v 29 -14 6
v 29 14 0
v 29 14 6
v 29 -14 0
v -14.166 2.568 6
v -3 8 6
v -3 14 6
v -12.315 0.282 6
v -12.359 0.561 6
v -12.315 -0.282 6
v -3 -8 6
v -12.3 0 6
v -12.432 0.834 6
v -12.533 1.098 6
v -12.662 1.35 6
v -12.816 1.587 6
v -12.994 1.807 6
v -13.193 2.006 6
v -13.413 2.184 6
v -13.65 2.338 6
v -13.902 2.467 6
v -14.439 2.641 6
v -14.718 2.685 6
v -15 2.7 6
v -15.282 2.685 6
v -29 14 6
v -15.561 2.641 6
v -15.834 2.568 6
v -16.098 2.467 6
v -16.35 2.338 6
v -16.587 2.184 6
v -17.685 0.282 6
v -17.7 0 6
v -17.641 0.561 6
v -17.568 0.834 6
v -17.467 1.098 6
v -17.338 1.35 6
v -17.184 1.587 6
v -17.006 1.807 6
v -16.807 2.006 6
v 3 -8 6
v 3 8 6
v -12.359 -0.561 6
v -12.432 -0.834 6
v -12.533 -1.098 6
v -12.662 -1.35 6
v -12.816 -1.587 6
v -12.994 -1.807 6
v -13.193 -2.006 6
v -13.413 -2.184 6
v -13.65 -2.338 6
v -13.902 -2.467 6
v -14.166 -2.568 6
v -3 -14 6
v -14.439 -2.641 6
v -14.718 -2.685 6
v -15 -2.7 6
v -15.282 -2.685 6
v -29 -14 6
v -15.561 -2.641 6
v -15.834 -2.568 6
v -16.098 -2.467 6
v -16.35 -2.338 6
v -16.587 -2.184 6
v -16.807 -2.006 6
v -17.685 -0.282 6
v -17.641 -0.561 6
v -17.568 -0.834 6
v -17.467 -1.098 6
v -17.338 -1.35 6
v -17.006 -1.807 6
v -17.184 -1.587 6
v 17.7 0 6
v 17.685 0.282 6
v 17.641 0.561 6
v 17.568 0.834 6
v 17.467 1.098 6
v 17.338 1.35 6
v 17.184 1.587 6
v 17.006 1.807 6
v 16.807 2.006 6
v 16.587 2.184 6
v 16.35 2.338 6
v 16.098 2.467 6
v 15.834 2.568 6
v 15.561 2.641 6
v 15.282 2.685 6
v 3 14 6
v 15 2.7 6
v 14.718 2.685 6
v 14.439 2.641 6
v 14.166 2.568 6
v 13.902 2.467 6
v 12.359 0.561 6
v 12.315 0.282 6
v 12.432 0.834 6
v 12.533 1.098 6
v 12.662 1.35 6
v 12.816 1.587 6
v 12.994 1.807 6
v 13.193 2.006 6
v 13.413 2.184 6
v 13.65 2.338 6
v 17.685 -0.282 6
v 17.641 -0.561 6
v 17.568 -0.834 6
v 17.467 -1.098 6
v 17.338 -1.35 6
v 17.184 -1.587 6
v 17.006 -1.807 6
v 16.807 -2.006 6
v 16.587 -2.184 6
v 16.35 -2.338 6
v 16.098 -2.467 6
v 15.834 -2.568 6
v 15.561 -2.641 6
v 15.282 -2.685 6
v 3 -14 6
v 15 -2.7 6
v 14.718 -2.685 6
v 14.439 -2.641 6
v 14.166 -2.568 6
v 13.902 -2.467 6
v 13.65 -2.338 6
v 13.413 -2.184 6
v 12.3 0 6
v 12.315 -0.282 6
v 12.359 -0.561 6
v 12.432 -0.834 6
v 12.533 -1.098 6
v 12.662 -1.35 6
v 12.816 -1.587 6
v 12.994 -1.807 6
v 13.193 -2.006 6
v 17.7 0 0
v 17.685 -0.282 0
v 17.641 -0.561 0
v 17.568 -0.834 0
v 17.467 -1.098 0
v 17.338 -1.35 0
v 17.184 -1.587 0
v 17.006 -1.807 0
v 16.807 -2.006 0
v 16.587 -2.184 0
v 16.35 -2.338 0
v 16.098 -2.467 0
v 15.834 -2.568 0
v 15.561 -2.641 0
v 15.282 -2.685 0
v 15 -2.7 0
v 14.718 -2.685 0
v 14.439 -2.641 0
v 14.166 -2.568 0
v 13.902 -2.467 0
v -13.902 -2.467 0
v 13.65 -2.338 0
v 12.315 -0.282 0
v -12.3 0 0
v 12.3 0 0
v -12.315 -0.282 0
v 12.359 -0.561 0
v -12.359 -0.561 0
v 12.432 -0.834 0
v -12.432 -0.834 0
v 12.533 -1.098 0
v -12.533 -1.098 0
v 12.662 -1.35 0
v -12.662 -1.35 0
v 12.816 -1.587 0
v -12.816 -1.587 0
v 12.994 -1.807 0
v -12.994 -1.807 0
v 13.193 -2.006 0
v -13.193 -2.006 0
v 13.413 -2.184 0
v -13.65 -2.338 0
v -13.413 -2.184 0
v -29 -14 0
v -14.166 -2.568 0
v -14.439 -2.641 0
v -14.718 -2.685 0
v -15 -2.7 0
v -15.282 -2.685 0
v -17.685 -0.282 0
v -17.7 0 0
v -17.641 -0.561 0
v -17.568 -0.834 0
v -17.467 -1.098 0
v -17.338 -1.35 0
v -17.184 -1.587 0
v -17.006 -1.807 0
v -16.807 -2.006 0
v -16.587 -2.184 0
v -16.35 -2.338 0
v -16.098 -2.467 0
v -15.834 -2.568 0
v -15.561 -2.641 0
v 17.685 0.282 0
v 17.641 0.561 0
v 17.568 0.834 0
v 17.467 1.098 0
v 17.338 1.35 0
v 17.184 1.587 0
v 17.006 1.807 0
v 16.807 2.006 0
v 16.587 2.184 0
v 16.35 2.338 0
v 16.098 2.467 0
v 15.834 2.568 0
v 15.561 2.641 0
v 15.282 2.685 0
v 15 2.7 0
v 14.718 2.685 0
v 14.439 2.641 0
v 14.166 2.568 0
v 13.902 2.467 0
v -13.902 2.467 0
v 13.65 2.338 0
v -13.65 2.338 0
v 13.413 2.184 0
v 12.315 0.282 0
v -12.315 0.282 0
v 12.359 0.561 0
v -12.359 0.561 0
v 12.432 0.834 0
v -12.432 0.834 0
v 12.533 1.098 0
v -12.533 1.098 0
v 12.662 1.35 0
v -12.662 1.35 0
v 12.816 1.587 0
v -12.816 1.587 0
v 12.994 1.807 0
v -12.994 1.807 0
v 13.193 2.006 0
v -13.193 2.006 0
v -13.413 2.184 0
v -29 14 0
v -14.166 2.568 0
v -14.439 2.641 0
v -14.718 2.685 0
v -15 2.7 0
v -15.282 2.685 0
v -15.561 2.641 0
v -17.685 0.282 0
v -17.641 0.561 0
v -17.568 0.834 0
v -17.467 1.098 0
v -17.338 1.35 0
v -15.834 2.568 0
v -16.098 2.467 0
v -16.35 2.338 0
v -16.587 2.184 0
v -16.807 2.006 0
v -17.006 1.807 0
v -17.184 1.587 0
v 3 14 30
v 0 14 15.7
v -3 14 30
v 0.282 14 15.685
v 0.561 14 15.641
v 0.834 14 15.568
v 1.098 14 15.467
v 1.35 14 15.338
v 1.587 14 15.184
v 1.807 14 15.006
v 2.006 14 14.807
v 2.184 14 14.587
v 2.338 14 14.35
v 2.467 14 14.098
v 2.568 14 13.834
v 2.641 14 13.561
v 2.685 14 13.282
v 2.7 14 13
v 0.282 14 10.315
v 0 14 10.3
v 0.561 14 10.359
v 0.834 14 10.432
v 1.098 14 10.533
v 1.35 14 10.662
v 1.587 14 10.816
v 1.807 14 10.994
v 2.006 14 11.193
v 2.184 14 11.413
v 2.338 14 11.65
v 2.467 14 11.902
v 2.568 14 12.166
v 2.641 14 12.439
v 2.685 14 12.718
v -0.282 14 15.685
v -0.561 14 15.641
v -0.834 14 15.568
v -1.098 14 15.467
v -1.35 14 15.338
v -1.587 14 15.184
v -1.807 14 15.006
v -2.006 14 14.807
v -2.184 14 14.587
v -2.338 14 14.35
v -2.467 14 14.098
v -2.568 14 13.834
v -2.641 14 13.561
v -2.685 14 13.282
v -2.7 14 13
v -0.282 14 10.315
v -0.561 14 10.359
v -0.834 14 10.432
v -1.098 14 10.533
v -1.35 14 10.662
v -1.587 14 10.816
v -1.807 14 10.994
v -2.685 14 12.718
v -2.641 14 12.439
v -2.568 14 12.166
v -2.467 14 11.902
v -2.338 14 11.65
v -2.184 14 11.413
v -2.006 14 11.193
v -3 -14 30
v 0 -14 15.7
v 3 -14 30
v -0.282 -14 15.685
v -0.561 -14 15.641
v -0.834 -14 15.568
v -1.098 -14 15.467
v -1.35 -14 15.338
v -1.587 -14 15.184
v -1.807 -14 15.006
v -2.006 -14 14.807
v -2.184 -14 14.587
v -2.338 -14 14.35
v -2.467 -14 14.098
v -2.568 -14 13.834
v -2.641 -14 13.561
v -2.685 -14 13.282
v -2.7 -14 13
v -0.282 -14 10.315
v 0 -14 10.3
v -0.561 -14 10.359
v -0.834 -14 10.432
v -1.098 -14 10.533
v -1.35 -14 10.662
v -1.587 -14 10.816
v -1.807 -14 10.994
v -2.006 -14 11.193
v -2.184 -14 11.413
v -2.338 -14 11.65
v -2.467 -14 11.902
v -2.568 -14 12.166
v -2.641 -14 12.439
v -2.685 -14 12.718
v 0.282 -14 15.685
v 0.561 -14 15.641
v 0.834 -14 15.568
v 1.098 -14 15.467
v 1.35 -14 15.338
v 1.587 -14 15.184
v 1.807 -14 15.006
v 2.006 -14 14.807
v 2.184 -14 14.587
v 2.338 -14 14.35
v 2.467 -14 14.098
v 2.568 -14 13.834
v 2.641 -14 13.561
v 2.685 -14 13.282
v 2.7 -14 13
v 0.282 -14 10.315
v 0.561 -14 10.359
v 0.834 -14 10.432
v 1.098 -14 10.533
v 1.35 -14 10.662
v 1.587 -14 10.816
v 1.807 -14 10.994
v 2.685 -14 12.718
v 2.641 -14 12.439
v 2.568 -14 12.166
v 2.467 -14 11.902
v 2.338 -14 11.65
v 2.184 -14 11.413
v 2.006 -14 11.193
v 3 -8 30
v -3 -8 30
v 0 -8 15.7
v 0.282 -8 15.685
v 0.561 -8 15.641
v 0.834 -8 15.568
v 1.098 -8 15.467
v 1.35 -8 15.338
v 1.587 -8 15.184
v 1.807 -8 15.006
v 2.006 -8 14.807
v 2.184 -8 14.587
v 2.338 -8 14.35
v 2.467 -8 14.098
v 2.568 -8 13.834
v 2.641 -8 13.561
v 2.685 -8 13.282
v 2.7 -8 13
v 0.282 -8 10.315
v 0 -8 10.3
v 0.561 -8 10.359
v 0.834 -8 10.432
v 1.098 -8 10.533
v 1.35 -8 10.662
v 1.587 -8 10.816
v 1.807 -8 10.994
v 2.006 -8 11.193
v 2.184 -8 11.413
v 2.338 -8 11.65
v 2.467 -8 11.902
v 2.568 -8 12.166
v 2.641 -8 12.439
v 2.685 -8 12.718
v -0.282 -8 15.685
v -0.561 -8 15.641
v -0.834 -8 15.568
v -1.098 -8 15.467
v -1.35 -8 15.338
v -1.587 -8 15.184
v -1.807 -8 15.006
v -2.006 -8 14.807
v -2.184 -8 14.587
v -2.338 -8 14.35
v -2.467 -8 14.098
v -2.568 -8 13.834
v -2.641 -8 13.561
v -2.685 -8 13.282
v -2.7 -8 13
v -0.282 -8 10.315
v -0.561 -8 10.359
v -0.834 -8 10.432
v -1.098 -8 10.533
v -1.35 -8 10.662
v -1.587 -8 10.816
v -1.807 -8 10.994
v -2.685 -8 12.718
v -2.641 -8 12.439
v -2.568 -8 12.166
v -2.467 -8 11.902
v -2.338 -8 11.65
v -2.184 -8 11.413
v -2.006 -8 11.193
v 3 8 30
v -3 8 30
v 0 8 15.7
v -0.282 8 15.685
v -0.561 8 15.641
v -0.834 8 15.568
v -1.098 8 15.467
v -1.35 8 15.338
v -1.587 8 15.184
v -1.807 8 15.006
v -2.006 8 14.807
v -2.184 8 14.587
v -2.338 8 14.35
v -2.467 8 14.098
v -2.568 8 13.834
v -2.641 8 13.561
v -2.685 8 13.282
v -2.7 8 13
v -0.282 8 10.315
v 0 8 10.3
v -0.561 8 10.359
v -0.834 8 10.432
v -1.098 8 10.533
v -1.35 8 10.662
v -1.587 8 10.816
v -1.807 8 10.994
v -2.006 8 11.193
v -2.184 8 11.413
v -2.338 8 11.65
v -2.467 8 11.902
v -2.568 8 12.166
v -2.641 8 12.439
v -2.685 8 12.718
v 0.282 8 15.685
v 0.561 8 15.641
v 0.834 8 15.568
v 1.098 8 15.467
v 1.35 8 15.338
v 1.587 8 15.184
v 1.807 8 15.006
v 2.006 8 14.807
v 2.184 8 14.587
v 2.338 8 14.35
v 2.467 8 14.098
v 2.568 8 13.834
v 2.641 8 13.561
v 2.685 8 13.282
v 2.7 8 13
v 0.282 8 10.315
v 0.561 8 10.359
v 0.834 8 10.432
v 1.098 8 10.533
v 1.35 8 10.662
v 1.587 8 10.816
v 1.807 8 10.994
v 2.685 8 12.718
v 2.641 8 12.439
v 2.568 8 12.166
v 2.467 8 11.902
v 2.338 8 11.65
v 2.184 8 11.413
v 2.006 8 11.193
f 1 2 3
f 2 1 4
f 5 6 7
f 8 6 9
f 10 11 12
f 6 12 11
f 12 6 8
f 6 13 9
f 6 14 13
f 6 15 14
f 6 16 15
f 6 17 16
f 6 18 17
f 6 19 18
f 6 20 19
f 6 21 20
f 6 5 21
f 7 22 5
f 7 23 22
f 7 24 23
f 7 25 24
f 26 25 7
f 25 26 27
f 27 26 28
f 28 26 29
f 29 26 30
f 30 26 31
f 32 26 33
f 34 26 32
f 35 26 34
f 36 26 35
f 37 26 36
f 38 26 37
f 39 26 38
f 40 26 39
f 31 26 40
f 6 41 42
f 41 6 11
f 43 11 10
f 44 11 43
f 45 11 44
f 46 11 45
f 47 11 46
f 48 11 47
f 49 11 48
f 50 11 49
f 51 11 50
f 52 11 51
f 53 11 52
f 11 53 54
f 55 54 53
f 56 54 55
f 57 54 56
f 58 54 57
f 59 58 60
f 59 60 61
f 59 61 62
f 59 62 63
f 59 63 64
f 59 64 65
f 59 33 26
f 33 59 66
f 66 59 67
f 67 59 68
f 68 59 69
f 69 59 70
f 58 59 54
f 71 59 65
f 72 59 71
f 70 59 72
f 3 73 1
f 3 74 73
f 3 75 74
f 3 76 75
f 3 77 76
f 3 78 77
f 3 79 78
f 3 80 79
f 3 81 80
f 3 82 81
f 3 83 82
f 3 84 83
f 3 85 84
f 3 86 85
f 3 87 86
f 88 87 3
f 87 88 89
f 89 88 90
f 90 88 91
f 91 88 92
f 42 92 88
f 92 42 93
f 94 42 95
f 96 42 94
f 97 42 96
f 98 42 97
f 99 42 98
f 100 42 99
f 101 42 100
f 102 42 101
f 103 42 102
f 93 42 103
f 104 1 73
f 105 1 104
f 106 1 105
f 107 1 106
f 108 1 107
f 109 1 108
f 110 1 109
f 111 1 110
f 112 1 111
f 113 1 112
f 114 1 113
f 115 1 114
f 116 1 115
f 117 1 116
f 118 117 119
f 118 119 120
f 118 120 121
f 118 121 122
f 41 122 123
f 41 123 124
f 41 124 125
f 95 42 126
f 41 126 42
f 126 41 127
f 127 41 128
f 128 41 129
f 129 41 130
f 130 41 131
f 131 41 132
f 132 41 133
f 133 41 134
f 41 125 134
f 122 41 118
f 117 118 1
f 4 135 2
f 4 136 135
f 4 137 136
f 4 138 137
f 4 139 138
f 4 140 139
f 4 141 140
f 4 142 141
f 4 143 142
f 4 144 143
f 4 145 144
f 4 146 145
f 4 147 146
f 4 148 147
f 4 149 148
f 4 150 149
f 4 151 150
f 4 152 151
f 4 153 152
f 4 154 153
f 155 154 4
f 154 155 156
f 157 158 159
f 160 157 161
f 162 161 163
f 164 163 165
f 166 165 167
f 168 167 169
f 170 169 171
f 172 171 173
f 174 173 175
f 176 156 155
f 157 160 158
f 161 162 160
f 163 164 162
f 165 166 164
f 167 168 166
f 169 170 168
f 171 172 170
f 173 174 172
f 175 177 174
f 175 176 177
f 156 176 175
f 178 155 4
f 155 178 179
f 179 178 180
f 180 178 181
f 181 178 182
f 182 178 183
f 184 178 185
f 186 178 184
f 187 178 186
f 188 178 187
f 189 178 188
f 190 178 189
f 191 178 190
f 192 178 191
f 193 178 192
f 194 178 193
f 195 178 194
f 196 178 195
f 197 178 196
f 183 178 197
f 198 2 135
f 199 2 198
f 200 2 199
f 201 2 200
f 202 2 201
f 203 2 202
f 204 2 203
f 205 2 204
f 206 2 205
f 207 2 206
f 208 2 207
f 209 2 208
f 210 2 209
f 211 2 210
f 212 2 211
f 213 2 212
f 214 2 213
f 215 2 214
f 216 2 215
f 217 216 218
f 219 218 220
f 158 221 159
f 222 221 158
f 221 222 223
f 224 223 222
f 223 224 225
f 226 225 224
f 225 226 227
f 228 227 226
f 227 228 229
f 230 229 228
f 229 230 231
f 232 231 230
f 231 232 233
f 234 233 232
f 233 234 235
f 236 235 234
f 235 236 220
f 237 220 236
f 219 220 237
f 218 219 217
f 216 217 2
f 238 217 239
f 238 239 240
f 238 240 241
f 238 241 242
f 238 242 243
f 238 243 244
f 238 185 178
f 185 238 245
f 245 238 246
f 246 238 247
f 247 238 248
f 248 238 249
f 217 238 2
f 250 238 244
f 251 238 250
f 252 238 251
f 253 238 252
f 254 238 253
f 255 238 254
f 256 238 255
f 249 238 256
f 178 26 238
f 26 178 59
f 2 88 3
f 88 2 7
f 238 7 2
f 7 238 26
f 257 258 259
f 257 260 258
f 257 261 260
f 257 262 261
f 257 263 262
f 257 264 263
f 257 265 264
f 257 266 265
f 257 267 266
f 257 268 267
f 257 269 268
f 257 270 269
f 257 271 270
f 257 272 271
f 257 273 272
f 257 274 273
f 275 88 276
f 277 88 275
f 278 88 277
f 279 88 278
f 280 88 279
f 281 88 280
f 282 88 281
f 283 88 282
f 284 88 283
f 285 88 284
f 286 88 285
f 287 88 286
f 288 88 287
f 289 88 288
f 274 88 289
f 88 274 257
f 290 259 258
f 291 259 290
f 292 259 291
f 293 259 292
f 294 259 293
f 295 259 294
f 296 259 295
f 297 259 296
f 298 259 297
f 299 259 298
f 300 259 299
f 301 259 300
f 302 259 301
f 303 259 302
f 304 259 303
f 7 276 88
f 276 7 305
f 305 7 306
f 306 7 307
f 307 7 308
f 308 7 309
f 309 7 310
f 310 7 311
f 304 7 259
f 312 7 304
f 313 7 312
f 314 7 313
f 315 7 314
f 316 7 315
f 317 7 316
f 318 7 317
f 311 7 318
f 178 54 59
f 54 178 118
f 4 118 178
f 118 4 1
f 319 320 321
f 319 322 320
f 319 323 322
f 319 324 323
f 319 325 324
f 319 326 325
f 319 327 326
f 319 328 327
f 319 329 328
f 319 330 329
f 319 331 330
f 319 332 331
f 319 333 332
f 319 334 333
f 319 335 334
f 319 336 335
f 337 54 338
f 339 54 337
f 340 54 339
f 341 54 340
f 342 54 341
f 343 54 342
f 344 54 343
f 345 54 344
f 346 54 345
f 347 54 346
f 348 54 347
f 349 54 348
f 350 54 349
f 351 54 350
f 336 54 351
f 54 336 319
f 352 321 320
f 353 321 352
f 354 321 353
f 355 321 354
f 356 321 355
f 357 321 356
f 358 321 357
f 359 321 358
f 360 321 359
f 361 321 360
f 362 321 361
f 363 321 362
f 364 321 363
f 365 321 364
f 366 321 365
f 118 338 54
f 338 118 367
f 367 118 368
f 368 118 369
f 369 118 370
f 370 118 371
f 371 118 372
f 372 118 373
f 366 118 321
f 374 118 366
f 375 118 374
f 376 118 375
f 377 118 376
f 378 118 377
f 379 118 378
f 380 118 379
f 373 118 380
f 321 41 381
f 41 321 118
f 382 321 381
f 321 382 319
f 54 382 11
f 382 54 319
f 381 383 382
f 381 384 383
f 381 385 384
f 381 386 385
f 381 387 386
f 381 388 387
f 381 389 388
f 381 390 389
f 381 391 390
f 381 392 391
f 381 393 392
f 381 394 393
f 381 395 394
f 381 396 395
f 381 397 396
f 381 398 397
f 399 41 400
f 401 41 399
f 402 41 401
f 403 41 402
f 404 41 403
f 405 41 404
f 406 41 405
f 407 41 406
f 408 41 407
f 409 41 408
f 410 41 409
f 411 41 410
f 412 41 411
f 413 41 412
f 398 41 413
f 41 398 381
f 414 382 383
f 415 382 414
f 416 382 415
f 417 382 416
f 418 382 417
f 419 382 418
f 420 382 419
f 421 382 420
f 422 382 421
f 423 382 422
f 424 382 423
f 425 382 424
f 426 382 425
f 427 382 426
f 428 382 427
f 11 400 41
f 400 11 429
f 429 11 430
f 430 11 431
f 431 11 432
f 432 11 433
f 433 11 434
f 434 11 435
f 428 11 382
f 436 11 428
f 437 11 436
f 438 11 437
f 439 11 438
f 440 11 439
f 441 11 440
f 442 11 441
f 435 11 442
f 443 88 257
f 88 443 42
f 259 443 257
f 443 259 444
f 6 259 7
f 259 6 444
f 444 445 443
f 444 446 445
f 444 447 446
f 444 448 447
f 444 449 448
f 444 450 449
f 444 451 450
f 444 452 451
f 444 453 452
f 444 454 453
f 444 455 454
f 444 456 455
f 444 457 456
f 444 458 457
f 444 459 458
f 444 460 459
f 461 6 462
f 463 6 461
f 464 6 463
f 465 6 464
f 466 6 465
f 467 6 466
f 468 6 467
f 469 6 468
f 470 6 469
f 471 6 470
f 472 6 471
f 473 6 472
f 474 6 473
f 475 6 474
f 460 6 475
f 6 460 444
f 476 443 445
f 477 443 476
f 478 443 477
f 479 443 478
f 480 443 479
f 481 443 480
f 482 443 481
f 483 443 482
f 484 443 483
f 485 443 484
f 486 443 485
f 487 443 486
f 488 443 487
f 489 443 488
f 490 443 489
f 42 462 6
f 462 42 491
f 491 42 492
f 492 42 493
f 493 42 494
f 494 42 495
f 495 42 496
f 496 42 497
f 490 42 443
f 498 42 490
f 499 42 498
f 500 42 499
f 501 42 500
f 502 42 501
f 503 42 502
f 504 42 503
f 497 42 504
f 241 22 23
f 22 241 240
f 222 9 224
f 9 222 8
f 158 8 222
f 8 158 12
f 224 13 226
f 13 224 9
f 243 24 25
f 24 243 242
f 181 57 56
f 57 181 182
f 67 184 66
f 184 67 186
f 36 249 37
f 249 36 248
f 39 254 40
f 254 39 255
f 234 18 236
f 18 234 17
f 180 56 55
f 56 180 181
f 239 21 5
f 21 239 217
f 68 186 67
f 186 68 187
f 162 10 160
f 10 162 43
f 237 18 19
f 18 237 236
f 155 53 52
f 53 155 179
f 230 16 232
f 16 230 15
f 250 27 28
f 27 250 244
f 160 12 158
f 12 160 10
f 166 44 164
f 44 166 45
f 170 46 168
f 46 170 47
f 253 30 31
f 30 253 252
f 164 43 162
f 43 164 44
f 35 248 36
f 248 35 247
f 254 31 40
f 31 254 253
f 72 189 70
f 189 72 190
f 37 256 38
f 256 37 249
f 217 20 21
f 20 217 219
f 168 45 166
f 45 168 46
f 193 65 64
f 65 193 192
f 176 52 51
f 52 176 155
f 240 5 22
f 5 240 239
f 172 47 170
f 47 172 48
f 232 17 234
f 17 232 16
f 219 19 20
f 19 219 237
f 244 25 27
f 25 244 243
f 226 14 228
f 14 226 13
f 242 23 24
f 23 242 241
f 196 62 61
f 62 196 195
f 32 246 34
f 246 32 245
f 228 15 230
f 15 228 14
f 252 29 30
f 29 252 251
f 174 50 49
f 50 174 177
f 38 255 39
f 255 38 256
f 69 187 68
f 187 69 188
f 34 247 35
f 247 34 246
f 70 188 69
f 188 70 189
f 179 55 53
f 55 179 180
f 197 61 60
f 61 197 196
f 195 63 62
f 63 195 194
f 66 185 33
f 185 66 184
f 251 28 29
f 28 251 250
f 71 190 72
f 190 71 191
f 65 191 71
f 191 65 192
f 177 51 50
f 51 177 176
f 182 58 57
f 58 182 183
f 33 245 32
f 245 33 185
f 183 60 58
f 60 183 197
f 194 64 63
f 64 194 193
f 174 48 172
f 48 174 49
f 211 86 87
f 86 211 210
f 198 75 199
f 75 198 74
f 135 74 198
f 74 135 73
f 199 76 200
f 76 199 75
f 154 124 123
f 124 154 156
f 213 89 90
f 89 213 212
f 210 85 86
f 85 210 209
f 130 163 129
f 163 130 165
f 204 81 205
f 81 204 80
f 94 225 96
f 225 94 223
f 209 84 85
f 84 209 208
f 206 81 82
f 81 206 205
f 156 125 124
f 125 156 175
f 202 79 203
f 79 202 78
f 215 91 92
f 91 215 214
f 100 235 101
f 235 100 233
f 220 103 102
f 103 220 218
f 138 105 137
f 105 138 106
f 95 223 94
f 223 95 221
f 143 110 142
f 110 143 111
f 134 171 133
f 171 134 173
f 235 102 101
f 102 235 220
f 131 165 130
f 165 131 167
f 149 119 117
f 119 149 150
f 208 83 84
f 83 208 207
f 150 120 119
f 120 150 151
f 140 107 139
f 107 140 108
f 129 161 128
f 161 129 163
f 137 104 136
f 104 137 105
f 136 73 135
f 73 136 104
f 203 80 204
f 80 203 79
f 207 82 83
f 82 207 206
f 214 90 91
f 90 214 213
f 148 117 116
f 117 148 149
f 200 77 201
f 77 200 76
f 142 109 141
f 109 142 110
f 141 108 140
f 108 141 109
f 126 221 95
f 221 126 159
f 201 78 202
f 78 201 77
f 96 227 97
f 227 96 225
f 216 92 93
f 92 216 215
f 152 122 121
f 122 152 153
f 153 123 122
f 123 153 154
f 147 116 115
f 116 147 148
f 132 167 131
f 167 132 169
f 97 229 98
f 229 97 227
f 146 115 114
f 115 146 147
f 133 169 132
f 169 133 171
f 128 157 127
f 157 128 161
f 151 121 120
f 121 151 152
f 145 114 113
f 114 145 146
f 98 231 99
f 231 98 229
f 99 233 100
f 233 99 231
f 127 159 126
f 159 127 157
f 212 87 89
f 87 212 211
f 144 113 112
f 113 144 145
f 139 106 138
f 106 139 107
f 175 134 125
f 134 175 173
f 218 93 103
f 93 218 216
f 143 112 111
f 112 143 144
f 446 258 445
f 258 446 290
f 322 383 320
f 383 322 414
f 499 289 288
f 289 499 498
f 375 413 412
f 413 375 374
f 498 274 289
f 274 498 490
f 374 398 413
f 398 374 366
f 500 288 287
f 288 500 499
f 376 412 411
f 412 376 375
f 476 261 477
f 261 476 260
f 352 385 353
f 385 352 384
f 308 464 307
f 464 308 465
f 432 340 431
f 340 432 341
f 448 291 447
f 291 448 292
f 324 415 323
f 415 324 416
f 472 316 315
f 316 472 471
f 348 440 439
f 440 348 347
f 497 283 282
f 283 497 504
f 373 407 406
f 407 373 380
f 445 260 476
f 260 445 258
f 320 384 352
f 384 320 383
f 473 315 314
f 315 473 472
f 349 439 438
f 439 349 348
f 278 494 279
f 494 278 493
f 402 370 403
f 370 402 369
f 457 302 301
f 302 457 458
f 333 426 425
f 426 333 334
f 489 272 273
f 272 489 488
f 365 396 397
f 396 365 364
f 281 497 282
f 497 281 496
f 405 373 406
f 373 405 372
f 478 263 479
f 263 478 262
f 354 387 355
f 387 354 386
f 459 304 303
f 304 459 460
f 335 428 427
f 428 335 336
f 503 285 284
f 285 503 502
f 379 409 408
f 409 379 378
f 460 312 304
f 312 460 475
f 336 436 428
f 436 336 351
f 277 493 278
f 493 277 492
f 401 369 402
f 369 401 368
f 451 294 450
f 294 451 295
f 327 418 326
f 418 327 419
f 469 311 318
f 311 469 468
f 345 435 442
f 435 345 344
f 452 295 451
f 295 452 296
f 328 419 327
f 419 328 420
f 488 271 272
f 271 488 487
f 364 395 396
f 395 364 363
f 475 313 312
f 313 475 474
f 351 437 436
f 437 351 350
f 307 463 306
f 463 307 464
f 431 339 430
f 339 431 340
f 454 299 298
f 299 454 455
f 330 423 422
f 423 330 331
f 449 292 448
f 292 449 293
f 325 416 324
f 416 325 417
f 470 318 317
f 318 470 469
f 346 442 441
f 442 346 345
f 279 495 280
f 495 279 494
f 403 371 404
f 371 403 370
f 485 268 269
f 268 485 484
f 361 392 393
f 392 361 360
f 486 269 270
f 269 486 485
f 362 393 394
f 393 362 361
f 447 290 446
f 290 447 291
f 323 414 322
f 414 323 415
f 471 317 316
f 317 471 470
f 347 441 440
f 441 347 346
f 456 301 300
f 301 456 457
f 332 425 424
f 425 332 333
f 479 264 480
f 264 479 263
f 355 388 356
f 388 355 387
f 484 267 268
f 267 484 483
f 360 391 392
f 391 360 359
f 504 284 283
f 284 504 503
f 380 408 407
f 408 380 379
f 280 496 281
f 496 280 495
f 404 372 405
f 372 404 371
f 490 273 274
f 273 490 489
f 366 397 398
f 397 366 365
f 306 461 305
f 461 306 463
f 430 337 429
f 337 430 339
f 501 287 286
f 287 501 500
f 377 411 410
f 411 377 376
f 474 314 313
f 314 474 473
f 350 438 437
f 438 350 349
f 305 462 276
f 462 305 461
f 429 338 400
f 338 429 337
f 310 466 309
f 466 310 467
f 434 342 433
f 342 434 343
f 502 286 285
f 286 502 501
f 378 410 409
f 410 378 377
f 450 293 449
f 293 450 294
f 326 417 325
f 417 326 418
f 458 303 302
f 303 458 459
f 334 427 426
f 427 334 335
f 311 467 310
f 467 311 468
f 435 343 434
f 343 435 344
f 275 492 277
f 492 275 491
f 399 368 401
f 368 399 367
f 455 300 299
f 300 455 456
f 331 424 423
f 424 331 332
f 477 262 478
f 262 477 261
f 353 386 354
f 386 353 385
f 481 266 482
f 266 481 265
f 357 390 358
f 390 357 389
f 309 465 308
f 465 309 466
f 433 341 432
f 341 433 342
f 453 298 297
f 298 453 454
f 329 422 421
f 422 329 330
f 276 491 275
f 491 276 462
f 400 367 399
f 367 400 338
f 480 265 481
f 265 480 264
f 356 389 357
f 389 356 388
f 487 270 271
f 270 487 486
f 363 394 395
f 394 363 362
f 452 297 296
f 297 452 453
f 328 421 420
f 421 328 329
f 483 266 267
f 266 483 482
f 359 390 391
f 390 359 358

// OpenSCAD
// Clevis mounting bracket for M5 pin.
$fn = 60;
eps = 0.02;
opening = 16;
ear_h = 26;
base_l = 58;
base_w = opening + 12;
base_t = 6;
ear_t = 6;
difference() {
    union() {
        translate([-base_l / 2, -base_w / 2, 0]) cube([base_l, base_w, base_t]);
        translate([-ear_t / 2, -base_w / 2, base_t - 2]) cube([ear_t, ear_t, ear_h]);
        translate([-ear_t / 2, base_w / 2 - ear_t, base_t - 2]) cube([ear_t, ear_t, ear_h]);
    }
    for (x = [-15, 15]) translate([x, 0, -eps]) cylinder(d = 5.4, h = base_t + 2 * eps);
    translate([0, -base_w / 2 - eps, ear_h / 2]) rotate([-90, 0, 0]) cylinder(d = 5.4, h = base_w + 2 * eps);
}
